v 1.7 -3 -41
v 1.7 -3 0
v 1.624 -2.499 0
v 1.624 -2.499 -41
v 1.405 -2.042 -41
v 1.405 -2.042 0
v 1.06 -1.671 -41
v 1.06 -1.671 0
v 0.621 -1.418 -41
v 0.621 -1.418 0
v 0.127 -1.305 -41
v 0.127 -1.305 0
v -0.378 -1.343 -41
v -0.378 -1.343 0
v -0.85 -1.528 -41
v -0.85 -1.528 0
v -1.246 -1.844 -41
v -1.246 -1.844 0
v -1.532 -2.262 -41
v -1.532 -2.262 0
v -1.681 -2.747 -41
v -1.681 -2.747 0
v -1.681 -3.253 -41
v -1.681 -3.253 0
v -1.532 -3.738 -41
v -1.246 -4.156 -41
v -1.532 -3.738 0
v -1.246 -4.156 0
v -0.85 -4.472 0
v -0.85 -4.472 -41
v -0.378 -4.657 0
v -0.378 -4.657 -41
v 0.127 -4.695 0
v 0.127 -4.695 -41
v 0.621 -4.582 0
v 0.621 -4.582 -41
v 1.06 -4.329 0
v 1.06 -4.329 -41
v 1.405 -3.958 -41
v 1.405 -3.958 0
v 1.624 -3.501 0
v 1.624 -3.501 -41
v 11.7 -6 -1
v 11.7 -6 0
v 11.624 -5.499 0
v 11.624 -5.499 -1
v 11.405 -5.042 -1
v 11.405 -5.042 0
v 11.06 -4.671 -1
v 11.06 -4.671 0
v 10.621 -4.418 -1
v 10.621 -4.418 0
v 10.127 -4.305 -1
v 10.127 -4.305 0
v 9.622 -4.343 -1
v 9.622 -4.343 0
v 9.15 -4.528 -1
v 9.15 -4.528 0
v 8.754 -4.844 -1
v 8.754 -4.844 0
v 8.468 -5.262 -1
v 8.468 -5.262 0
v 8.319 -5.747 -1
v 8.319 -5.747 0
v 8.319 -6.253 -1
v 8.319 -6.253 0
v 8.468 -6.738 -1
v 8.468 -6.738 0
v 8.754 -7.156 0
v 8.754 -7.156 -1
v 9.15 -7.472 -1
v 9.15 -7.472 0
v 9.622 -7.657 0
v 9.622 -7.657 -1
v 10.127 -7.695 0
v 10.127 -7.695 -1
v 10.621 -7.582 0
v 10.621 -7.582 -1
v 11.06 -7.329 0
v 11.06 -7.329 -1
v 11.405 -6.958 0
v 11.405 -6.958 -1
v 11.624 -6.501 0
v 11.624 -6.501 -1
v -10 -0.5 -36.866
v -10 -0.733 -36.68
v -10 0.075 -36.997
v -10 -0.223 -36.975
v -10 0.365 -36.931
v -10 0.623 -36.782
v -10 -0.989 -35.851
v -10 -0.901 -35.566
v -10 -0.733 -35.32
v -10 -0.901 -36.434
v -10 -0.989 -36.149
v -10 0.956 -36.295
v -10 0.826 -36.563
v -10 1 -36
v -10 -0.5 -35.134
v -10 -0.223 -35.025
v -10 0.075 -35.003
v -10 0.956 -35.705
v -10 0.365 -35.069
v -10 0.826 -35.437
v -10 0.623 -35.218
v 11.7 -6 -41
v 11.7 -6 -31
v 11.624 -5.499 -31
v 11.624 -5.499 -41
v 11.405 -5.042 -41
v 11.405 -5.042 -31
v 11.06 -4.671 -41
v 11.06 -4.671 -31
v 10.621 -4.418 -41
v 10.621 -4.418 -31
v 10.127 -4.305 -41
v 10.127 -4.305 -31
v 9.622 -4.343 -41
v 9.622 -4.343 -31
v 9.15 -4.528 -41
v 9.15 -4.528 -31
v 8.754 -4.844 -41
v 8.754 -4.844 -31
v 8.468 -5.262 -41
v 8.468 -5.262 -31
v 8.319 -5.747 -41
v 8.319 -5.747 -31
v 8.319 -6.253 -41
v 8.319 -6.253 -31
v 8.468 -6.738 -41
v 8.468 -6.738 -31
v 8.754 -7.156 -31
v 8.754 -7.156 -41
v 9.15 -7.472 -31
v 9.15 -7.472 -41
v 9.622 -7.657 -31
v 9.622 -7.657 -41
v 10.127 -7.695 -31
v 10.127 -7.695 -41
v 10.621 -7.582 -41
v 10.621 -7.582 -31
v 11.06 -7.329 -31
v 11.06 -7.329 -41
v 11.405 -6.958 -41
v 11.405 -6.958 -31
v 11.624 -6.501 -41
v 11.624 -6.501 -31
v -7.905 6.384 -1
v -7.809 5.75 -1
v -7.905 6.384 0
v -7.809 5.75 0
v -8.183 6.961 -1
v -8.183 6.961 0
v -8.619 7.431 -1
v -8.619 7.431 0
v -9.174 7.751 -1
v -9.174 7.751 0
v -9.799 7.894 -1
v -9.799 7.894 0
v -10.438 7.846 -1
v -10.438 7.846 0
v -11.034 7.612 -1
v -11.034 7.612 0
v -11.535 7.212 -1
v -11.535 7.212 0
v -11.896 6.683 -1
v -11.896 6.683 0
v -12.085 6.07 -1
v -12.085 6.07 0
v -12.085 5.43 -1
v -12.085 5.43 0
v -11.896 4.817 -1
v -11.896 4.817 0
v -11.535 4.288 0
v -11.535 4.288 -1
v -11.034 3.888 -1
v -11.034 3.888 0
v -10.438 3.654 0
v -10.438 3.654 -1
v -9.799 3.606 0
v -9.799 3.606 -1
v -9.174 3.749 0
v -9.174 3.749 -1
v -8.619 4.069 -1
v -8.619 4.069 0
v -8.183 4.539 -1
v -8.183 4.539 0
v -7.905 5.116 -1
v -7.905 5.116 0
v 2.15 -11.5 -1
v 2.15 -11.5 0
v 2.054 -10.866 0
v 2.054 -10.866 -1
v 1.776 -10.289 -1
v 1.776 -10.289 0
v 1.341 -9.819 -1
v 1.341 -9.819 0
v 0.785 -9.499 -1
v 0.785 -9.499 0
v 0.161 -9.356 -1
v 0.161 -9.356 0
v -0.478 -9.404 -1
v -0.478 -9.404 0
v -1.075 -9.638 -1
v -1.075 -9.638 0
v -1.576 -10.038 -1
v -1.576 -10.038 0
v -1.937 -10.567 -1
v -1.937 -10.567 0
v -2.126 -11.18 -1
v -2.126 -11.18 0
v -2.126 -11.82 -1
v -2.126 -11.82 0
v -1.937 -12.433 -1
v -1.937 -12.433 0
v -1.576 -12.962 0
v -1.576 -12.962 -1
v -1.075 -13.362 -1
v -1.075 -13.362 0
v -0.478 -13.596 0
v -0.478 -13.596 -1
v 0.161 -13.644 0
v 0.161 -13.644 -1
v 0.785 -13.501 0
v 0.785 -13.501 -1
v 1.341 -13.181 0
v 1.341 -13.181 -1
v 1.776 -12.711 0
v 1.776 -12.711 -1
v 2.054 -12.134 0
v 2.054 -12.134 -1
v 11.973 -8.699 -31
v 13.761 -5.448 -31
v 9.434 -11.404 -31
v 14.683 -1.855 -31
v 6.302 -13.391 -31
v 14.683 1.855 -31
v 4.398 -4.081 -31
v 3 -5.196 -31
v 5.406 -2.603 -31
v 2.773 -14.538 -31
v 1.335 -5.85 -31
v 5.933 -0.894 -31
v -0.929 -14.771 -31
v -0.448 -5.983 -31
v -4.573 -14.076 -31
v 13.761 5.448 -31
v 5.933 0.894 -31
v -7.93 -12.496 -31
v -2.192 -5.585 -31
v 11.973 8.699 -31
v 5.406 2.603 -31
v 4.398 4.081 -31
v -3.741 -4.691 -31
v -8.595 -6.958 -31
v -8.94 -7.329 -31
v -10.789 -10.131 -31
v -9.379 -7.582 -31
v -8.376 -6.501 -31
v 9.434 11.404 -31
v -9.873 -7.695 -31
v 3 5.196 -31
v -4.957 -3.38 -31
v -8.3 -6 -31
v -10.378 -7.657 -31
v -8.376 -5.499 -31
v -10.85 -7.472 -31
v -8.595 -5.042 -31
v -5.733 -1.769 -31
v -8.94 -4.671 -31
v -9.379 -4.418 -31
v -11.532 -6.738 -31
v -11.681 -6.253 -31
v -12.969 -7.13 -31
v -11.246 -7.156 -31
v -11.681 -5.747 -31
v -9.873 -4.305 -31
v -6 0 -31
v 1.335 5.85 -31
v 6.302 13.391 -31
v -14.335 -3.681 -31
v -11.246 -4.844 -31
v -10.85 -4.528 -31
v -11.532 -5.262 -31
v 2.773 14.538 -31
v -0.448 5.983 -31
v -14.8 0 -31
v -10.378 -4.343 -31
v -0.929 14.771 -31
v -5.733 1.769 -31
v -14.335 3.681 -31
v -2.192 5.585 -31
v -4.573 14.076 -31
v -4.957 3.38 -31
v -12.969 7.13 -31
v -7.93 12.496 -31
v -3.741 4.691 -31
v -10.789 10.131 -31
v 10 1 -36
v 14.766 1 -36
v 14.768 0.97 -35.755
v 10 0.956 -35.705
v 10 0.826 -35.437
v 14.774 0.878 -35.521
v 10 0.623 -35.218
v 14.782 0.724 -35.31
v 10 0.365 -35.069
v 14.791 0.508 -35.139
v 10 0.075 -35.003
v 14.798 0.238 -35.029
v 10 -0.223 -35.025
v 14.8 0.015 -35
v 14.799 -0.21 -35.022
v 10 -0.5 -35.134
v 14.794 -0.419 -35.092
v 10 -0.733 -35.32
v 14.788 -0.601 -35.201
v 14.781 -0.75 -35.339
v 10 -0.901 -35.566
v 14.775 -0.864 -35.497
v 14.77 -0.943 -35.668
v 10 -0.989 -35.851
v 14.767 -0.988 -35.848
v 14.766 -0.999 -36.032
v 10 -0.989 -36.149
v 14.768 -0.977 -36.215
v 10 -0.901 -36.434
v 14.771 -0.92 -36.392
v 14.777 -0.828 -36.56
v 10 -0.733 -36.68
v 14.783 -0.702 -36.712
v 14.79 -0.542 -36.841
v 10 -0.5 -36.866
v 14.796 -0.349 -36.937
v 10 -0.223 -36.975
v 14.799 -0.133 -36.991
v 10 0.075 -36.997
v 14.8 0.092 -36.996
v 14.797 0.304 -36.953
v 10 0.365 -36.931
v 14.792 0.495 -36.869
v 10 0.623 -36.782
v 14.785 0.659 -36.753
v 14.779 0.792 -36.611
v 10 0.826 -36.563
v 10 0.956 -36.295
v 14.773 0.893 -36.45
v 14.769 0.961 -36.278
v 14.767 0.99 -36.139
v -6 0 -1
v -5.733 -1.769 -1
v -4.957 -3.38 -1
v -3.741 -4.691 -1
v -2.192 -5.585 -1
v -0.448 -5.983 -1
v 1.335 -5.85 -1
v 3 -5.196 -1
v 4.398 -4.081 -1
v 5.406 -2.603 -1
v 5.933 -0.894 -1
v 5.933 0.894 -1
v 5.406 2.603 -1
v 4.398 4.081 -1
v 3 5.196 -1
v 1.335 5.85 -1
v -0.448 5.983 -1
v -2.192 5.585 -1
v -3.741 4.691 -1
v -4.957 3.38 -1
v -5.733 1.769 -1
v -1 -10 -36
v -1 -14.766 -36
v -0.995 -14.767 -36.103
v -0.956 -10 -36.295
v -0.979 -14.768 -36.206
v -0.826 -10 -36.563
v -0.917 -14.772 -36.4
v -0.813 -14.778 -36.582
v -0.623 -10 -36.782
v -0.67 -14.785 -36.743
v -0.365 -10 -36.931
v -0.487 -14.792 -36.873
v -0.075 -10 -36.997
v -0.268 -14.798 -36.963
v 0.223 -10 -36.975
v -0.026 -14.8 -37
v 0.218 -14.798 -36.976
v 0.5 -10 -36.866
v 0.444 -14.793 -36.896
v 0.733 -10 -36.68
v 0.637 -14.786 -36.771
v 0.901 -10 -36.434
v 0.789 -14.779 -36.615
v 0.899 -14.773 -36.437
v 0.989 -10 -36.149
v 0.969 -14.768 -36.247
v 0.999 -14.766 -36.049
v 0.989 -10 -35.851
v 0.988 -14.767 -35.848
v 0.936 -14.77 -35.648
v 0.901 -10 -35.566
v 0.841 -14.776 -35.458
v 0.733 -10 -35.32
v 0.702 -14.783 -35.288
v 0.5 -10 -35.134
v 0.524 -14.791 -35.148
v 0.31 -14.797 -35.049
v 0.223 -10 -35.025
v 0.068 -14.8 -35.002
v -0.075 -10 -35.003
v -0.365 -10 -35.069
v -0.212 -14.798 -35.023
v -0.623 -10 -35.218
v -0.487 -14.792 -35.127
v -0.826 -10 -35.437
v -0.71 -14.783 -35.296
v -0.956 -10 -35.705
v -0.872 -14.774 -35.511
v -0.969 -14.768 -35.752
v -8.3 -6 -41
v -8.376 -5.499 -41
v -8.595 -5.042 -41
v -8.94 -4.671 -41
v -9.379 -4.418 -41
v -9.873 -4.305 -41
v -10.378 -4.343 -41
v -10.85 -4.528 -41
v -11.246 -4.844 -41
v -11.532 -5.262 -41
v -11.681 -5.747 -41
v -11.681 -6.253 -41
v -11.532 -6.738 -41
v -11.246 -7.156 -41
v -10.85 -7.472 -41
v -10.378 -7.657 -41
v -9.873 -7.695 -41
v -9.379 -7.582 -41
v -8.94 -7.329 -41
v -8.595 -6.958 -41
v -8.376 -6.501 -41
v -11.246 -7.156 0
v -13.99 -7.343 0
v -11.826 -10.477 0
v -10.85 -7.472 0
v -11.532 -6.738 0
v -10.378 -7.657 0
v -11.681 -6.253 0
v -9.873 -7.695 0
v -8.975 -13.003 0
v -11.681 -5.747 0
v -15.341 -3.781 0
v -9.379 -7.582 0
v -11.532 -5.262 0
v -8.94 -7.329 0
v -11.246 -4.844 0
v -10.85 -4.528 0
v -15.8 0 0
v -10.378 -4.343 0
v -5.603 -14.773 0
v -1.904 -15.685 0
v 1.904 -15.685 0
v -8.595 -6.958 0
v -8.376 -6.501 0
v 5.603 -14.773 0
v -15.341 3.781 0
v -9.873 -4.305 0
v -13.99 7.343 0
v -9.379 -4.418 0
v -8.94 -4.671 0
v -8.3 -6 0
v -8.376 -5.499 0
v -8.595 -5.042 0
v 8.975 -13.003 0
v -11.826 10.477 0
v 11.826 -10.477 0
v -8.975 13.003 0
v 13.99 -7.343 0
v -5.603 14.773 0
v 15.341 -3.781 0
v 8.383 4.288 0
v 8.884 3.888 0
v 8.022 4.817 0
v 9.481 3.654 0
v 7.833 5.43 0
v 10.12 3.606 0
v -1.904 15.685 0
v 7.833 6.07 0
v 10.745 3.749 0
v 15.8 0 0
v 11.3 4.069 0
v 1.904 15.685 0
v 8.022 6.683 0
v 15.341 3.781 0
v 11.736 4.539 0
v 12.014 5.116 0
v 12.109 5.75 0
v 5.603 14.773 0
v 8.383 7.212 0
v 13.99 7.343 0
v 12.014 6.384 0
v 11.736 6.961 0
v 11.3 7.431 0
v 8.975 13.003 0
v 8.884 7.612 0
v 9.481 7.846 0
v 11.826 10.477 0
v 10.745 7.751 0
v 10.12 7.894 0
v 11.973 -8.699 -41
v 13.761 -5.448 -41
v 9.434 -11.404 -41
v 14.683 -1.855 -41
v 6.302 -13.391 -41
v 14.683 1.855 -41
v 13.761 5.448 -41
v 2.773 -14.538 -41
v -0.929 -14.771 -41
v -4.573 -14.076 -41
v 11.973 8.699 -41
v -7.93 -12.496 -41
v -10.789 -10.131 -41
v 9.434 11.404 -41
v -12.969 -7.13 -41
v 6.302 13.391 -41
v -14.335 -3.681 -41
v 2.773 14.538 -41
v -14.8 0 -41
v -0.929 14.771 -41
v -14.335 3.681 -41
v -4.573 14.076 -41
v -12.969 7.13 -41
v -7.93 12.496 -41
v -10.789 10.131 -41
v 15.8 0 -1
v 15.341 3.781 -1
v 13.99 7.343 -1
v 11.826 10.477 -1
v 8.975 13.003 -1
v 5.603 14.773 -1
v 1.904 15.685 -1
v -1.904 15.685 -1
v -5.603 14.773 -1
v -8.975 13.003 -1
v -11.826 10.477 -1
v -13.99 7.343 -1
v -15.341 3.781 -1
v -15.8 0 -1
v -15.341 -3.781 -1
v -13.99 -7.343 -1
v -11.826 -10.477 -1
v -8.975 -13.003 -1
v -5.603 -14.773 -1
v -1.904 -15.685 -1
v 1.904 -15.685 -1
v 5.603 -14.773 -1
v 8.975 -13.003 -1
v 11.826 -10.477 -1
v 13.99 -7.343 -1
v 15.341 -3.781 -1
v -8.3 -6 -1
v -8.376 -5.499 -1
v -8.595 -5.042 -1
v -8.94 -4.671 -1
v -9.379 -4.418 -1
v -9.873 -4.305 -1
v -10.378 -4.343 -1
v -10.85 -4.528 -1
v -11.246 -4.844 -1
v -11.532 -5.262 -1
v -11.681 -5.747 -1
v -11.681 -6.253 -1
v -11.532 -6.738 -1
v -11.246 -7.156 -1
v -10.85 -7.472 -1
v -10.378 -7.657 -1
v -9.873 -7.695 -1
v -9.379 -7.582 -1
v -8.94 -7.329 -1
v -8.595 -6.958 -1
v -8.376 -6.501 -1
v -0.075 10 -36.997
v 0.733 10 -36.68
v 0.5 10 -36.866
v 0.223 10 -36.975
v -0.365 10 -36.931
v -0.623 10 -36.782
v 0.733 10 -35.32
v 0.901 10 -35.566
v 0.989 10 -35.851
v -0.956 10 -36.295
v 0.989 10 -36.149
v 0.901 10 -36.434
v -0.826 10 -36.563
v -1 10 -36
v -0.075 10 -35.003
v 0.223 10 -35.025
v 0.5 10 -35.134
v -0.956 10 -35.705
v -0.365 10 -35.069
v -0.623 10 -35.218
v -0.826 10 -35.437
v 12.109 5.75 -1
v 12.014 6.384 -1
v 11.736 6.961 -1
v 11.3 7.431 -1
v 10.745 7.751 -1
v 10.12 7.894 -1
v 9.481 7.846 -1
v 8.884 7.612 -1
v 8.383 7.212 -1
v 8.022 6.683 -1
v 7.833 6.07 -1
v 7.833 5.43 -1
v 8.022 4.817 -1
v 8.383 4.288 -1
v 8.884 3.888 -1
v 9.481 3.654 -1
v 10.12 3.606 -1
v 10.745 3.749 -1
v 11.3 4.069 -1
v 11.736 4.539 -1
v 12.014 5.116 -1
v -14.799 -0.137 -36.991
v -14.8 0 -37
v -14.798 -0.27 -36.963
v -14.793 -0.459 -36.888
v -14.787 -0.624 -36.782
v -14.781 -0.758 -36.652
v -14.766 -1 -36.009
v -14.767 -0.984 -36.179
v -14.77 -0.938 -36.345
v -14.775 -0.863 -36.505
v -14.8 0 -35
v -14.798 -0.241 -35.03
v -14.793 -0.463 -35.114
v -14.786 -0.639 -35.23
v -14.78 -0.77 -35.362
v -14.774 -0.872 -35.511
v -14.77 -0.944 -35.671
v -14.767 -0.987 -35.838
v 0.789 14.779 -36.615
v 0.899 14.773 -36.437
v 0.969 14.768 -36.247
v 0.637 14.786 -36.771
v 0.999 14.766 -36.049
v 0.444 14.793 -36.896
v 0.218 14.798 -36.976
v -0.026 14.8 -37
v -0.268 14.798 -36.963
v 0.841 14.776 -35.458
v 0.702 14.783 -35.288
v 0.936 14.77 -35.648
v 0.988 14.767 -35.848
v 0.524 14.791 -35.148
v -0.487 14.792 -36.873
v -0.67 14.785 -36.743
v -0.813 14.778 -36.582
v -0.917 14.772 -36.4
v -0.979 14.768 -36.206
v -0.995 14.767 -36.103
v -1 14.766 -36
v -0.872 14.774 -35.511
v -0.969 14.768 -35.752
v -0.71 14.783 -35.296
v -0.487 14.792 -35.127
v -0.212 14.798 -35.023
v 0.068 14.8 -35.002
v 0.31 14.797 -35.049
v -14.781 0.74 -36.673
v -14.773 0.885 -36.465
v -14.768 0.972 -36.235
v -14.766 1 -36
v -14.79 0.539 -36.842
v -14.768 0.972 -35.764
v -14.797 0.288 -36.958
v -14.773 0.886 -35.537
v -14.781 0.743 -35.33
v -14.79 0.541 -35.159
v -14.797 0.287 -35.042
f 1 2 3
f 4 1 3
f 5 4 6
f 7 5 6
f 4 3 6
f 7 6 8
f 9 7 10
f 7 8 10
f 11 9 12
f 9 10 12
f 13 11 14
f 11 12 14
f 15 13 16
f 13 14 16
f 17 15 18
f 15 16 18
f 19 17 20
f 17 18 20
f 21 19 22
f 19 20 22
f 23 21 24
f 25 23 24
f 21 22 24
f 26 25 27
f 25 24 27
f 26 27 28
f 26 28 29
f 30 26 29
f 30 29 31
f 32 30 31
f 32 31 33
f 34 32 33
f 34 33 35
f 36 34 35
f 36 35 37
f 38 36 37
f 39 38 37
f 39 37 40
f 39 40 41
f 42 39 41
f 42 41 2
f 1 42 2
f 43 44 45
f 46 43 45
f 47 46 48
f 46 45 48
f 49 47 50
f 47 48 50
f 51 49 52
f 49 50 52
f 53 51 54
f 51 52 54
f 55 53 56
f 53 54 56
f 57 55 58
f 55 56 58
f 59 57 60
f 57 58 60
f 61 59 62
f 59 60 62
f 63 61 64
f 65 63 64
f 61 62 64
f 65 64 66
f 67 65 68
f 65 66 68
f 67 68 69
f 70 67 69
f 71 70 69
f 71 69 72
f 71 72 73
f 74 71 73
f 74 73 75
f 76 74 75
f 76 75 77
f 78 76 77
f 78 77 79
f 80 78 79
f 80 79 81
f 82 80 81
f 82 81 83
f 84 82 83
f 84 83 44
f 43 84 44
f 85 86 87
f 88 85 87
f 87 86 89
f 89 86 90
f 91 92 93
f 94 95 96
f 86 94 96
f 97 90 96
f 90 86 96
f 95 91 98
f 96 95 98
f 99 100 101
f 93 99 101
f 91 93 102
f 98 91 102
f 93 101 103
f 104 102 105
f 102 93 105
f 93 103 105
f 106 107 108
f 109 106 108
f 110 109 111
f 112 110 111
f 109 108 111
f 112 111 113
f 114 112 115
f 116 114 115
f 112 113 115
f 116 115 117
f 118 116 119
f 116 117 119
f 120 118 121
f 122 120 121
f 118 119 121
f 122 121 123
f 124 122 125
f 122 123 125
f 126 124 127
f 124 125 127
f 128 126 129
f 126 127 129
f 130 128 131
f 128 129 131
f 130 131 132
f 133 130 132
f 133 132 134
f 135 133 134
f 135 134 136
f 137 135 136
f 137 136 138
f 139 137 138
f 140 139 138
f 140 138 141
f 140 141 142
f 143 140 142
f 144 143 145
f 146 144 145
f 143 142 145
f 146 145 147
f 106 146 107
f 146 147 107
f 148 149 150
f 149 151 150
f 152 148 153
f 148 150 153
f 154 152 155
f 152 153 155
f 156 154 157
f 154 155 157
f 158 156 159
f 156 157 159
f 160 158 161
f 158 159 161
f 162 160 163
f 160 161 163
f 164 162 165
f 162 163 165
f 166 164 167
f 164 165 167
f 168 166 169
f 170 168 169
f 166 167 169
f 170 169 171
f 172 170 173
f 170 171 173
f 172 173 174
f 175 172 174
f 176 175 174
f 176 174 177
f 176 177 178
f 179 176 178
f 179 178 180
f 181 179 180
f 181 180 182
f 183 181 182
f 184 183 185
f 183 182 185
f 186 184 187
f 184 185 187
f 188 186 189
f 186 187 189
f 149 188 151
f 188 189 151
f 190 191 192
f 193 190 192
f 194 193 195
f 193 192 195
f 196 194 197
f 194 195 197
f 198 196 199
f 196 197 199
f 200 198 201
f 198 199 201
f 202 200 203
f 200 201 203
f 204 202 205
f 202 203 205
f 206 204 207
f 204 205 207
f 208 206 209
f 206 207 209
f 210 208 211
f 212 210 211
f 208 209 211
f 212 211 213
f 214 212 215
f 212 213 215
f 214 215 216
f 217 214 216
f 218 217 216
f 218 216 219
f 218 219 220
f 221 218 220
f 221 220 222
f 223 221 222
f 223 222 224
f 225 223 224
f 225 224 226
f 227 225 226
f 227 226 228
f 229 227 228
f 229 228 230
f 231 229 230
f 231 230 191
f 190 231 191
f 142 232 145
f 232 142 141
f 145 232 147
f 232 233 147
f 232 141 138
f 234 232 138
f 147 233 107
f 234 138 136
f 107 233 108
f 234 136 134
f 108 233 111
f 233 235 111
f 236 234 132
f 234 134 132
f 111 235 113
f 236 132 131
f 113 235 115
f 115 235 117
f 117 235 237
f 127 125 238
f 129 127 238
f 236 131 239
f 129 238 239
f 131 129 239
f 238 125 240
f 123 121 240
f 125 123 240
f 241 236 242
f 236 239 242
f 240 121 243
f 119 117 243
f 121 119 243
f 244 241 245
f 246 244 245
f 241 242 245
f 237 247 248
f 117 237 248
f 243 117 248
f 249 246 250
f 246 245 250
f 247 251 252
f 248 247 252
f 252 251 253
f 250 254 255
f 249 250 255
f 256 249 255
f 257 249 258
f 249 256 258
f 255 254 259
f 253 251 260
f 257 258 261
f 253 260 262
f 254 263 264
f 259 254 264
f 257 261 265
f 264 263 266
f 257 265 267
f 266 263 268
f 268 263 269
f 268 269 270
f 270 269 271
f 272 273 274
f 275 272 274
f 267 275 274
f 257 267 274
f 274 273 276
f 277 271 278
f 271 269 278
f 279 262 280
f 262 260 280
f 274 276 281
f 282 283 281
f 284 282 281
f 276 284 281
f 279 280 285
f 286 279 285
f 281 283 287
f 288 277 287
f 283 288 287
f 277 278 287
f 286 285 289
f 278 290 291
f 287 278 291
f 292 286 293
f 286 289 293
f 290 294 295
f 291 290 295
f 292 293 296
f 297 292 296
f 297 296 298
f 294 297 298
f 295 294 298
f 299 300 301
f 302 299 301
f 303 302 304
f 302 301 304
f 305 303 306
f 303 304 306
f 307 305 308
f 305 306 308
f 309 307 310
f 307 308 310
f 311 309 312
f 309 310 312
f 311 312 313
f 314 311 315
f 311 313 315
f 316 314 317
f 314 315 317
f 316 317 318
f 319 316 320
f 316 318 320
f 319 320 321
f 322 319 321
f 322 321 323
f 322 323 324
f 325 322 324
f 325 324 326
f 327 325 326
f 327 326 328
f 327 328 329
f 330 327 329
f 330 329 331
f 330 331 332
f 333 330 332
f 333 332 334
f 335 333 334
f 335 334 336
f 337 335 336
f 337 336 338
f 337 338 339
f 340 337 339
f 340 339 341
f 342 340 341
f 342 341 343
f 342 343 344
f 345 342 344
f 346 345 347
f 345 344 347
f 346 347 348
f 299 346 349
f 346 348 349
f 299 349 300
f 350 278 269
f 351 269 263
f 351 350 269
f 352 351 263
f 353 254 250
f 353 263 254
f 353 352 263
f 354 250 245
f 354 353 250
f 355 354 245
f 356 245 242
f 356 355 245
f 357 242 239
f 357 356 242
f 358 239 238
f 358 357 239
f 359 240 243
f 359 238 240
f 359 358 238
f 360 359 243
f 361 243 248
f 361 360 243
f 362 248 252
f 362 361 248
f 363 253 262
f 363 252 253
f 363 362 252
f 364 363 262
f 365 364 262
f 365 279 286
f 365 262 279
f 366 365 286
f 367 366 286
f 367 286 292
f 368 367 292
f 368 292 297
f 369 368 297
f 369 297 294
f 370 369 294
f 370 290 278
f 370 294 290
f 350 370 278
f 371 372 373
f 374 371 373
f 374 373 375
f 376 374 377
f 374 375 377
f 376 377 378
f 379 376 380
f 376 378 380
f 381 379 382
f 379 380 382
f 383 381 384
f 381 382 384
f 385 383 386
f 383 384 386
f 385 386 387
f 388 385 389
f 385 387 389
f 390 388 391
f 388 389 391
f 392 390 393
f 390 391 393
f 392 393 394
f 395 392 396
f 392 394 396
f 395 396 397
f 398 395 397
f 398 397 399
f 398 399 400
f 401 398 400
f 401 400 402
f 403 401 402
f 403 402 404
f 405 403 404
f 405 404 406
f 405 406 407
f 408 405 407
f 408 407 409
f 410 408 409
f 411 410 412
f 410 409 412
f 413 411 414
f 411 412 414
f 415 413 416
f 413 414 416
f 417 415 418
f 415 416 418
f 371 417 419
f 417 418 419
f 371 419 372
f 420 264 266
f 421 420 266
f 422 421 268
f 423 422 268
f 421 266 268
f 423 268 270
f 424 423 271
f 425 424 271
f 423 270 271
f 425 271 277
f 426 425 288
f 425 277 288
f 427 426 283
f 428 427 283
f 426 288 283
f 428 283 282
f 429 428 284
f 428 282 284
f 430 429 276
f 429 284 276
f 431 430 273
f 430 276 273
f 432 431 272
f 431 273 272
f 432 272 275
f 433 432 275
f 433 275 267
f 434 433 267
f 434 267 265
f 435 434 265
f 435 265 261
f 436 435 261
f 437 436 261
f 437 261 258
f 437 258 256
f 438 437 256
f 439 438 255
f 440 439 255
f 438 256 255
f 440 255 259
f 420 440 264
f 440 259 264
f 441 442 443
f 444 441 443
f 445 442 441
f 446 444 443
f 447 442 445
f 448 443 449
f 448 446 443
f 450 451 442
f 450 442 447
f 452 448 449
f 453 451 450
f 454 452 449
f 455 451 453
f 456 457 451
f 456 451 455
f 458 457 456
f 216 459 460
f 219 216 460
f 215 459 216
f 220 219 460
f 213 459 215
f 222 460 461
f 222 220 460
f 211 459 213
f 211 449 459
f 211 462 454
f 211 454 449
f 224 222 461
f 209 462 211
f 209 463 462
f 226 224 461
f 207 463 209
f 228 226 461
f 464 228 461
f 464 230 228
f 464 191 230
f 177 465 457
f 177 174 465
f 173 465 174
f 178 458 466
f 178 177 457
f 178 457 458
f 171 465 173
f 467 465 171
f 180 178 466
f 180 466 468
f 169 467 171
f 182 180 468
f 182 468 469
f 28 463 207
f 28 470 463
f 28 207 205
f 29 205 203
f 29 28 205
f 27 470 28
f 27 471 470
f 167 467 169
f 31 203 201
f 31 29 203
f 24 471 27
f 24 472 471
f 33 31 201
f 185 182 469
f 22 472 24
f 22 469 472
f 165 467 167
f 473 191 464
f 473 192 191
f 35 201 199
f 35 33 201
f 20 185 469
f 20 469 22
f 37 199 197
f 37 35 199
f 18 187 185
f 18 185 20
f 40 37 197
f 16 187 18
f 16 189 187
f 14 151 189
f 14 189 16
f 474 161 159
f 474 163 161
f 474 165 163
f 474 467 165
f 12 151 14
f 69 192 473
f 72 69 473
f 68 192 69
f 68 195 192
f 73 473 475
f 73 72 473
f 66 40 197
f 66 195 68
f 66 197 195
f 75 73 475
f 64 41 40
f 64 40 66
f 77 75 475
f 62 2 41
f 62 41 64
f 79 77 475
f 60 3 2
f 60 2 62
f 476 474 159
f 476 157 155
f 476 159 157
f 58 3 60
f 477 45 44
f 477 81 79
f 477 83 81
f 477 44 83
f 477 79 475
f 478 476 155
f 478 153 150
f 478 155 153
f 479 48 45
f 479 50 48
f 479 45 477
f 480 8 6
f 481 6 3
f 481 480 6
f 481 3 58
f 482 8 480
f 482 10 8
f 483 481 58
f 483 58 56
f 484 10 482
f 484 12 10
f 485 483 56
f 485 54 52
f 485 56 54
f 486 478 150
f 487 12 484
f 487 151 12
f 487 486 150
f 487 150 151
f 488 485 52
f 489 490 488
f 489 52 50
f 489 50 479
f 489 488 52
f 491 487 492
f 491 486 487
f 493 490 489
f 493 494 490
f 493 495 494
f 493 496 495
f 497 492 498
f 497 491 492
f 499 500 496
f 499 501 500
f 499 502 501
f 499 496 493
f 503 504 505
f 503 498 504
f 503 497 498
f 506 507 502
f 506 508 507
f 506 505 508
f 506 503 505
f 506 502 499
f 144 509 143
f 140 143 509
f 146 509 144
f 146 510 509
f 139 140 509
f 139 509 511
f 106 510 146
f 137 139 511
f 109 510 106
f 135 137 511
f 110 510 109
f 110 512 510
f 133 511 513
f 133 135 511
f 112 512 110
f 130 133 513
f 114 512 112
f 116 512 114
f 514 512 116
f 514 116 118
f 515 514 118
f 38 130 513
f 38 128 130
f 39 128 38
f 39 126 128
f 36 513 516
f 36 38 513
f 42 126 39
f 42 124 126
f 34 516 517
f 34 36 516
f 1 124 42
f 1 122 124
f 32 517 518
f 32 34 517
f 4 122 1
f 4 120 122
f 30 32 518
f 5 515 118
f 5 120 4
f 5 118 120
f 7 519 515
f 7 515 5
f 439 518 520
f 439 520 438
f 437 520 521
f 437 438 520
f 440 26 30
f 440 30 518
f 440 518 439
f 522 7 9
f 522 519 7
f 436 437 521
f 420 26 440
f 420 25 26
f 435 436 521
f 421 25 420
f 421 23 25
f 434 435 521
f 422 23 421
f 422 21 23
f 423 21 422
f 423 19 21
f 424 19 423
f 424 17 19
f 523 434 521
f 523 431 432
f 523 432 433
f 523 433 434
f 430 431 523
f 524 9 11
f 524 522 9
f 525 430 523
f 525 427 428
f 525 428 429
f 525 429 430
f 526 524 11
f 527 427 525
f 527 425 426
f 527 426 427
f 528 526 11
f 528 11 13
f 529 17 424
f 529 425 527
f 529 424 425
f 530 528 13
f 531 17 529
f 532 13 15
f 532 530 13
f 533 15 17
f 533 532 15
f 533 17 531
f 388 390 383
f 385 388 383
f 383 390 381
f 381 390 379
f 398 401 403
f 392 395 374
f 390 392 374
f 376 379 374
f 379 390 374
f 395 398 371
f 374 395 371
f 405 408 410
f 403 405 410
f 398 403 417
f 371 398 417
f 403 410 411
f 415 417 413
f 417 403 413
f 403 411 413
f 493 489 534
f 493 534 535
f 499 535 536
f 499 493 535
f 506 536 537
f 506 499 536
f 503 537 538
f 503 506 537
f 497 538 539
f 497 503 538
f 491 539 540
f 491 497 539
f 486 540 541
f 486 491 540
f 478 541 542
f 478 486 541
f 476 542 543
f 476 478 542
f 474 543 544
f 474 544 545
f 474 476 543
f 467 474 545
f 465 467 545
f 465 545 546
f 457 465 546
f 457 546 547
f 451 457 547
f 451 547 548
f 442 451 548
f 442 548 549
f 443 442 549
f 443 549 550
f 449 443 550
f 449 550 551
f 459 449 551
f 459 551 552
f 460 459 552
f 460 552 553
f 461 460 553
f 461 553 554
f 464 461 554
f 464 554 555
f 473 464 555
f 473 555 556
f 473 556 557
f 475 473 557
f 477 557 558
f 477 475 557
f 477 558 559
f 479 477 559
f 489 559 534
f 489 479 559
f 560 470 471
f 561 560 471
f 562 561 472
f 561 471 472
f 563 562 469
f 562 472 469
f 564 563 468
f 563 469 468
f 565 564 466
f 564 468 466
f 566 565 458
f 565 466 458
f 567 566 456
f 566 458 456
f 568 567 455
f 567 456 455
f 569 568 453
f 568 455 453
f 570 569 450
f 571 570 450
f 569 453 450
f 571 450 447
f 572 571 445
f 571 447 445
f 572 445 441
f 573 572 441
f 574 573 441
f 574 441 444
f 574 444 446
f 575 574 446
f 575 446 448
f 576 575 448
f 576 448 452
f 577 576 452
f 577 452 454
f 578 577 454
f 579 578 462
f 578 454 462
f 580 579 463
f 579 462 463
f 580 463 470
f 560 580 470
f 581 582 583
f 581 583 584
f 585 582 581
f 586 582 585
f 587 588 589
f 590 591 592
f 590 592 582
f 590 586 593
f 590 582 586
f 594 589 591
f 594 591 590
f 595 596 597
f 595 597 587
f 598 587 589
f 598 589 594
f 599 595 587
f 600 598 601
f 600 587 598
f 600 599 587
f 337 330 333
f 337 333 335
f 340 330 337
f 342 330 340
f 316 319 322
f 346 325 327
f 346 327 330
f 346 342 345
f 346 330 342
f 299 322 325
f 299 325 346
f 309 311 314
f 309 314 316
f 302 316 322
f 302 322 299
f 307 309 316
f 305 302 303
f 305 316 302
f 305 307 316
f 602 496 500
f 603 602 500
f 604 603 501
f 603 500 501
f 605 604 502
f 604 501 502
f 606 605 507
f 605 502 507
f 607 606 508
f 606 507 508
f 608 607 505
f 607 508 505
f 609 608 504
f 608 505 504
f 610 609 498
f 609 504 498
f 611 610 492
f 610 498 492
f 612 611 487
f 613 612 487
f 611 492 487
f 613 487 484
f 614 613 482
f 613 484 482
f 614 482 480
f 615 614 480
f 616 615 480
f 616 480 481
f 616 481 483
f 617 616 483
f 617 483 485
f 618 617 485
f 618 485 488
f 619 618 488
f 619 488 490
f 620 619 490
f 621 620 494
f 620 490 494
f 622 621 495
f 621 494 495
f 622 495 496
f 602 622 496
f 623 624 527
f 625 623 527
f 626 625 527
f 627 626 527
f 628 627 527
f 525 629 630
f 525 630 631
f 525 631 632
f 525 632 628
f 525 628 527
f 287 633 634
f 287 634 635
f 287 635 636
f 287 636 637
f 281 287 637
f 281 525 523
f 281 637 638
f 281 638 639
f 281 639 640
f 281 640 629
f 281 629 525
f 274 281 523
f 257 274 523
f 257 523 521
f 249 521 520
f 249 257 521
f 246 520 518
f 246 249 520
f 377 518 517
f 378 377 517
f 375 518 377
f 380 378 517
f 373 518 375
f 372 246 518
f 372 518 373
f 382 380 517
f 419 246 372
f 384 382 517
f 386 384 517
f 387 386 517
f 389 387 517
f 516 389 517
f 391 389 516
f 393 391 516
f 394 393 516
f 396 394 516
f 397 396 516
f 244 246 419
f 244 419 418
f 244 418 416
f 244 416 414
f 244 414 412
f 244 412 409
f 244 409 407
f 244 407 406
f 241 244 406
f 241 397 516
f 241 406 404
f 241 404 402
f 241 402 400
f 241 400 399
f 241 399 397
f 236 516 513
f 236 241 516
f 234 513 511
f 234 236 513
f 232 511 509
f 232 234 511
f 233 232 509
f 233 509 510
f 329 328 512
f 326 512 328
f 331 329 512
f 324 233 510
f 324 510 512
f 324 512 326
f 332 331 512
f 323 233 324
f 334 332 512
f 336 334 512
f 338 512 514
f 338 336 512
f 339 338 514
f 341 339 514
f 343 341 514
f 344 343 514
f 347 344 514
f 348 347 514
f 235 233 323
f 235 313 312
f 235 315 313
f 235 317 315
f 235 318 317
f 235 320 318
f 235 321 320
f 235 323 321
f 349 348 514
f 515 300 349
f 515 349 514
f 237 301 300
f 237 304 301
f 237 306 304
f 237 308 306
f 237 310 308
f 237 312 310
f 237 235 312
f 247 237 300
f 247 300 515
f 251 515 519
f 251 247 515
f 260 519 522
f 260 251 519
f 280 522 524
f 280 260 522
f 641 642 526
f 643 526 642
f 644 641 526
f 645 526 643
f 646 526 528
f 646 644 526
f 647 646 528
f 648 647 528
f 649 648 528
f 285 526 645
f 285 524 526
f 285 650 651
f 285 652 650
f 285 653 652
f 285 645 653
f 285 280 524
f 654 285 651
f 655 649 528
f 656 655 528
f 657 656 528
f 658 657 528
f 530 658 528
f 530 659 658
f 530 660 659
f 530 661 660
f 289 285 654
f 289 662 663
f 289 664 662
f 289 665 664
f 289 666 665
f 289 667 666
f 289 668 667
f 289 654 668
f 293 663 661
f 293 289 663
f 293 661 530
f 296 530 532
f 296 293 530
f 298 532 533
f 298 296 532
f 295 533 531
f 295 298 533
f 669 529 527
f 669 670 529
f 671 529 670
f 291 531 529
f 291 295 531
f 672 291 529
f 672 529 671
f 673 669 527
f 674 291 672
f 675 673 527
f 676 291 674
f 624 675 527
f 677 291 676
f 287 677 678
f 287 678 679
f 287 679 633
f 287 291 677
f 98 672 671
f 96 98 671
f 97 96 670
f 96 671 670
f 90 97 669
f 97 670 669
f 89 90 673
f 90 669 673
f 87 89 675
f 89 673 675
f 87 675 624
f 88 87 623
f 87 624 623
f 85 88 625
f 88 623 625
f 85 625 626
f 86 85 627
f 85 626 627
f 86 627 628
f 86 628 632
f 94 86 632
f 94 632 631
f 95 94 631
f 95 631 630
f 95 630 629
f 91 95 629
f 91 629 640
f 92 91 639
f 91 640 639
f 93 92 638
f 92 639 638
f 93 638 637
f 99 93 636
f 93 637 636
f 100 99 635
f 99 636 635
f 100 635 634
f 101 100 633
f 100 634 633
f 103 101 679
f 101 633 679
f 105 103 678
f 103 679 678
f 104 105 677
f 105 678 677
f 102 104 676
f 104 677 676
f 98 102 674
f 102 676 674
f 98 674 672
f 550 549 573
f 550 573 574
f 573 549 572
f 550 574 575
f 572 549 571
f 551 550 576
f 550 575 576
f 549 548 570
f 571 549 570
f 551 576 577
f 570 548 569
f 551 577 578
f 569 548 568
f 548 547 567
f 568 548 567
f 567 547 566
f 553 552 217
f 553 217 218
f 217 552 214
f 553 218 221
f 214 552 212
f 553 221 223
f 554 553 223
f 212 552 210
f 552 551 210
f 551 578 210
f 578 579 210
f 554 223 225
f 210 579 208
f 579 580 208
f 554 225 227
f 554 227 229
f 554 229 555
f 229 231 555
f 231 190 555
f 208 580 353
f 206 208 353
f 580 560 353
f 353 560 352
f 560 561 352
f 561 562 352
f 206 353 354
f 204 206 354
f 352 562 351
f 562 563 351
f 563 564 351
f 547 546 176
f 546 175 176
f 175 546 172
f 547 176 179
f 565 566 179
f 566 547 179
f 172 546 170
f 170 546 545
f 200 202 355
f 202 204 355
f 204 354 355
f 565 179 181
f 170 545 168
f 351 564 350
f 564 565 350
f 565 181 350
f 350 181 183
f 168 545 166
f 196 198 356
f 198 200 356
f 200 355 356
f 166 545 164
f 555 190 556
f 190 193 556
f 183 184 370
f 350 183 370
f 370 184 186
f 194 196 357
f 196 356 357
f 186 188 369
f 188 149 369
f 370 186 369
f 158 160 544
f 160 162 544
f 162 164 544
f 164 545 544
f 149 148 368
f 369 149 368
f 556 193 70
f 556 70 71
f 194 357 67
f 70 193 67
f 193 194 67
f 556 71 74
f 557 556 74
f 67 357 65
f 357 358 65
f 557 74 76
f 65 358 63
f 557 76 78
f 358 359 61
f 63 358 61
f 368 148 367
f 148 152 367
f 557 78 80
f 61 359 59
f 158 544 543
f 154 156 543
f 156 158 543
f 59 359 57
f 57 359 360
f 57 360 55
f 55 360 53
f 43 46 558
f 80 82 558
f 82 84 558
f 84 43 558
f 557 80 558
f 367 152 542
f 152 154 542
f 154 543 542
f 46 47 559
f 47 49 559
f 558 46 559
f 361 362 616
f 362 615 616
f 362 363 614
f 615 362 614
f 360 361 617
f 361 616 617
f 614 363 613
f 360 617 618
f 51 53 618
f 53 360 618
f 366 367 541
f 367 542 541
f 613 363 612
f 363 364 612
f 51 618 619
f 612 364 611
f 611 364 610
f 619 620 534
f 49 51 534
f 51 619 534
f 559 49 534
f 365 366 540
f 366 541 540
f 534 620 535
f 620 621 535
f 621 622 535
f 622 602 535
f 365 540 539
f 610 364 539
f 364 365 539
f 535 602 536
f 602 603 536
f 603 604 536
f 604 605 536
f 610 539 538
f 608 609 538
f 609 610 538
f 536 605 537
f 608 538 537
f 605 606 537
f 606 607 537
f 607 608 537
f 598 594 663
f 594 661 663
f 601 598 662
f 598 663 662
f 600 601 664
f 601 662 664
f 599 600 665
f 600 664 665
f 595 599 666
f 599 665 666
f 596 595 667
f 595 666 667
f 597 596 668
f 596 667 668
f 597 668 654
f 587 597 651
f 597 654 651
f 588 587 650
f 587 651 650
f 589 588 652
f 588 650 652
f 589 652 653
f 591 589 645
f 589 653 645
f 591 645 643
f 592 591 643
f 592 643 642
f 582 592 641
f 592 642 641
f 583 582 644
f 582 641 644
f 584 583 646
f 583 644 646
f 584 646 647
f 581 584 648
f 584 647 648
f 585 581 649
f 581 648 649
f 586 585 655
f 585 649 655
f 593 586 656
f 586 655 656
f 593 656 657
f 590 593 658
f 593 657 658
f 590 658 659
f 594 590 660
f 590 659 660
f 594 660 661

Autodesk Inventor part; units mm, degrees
sketch "スケッチ2" plane through (0, 0, 0) normal (0, 0, 1) x (1, 0, 0)
  circle A0 centre (0, 0) radius 15.8
  dimension "d0" = 31.6
extrude "押し出し1" add sketch "スケッチ2" against normal blind 1
sketch "スケッチ11" plane through (0, 0, -1) normal (0, 0, -1) x (-1, 0, 0)
  circle A0 centre (0, 0) radius 6
  dimension "d85" = 12
extrude "押し出し9" add sketch "スケッチ11" along normal blind 30
sketch "スケッチ12" plane through (0, 0, -31) normal (0, 0, -1) x (-1, 0, 0)
  circle A0 centre (0, 0) radius 14.8
  dimension "d106" = 29.6
extrude "押し出し10" add sketch "スケッチ12" along normal blind 10
sketch "スケッチ13" plane through (0, 0, 0) normal (0, 0, 1) x (1, 0, 0)
  circle A0 centre (0, -3) radius 1.7
  circle A1 centre (-10, -6) radius 1.7
  circle A2 centre (10, -6) radius 1.7
  line L0 (0, 0) -> (0, 17.9574) construction
  dimension "d90" = 3.4
  dimension "d91" = 3.4
  dimension "d92" = 3.4
  dimension "d93" = 3
  dimension "d94" = 6
  dimension "d95" = 10
extrude "押し出し11" cut sketch "スケッチ13" against normal through all
sketch "スケッチ14" plane through (0, 0, 0) normal (0, 0, 1) x (1, 0, 0)
  circle A0 centre (0, -11.5) radius 2.15
  circle A1 centre (9.9593, 5.75) radius 2.15
  circle A2 centre (-9.9593, 5.75) radius 2.15
  point P0 (0, 0)
  dimension "d98" = 4.3
  dimension "d99" = 11.5
  dimension "d102" = 360
extrude "押し出し12" cut sketch "スケッチ14" against normal blind 1
ref_plane "作業平面1" through (15, 0, 0) normal (1, 0, 0) x (0, 1, 0)
ref_plane "作業平面2" through (-15, 0, 0) normal (1, 0, 0) x (0, 1, 0)
ref_plane "作業平面3" through (0, 15, 0) normal (0, 1, 0) x (-1, 0, 0)
ref_plane "作業平面4" through (0, -15, 0) normal (0, 1, 0) x (-1, 0, 0)
sketch "スケッチ16" plane through (15, 0, 0) normal (1, 0, 0) x (0, 1, 0)
  circle A0 centre (0, -36) radius 1
  line L0 (-14.8, -41) -> (14.8, -41) projected
  point P0 (0, 0)
  dimension "d111" = 2
  dimension "d112" = 5
sketch "スケッチ17" plane through (0, 15, 0) normal (0, 1, 0) x (-1, 0, 0)
  circle A0 centre (0, -36) radius 1
  line L0 (-14.8, -41) -> (14.8, -41) projected
  point P0 (0, 0)
  dimension "d113" = 2
  dimension "d114" = 5
sketch "スケッチ18" plane through (-15, 0, 0) normal (1, 0, 0) x (0, 1, 0)
  circle A0 centre (0, -36) radius 1
  line L0 (-14.8, -41) -> (14.8, -41) projected
  point P0 (0, 0)
  dimension "d115" = 2
  dimension "d116" = 5
sketch "スケッチ19" plane through (0, -15, 0) normal (0, 1, 0) x (-1, 0, 0)
  circle A0 centre (0, -36) radius 1
  line L0 (-14.8, -41) -> (14.8, -41) projected
  point P0 (0, 0)
  dimension "d117" = 2
  dimension "d118" = 5
extrude "押し出し13" cut sketch "スケッチ16" against normal blind 5
extrude "押し出し14" cut sketch "スケッチ17" against normal blind 5
extrude "押し出し15" cut sketch "スケッチ18" along normal blind 5
extrude "押し出し16" cut sketch "スケッチ19" along normal blind 5
properties part number "B_pipe_cylinder_5_1" material "ステンレス鋼 440C"
